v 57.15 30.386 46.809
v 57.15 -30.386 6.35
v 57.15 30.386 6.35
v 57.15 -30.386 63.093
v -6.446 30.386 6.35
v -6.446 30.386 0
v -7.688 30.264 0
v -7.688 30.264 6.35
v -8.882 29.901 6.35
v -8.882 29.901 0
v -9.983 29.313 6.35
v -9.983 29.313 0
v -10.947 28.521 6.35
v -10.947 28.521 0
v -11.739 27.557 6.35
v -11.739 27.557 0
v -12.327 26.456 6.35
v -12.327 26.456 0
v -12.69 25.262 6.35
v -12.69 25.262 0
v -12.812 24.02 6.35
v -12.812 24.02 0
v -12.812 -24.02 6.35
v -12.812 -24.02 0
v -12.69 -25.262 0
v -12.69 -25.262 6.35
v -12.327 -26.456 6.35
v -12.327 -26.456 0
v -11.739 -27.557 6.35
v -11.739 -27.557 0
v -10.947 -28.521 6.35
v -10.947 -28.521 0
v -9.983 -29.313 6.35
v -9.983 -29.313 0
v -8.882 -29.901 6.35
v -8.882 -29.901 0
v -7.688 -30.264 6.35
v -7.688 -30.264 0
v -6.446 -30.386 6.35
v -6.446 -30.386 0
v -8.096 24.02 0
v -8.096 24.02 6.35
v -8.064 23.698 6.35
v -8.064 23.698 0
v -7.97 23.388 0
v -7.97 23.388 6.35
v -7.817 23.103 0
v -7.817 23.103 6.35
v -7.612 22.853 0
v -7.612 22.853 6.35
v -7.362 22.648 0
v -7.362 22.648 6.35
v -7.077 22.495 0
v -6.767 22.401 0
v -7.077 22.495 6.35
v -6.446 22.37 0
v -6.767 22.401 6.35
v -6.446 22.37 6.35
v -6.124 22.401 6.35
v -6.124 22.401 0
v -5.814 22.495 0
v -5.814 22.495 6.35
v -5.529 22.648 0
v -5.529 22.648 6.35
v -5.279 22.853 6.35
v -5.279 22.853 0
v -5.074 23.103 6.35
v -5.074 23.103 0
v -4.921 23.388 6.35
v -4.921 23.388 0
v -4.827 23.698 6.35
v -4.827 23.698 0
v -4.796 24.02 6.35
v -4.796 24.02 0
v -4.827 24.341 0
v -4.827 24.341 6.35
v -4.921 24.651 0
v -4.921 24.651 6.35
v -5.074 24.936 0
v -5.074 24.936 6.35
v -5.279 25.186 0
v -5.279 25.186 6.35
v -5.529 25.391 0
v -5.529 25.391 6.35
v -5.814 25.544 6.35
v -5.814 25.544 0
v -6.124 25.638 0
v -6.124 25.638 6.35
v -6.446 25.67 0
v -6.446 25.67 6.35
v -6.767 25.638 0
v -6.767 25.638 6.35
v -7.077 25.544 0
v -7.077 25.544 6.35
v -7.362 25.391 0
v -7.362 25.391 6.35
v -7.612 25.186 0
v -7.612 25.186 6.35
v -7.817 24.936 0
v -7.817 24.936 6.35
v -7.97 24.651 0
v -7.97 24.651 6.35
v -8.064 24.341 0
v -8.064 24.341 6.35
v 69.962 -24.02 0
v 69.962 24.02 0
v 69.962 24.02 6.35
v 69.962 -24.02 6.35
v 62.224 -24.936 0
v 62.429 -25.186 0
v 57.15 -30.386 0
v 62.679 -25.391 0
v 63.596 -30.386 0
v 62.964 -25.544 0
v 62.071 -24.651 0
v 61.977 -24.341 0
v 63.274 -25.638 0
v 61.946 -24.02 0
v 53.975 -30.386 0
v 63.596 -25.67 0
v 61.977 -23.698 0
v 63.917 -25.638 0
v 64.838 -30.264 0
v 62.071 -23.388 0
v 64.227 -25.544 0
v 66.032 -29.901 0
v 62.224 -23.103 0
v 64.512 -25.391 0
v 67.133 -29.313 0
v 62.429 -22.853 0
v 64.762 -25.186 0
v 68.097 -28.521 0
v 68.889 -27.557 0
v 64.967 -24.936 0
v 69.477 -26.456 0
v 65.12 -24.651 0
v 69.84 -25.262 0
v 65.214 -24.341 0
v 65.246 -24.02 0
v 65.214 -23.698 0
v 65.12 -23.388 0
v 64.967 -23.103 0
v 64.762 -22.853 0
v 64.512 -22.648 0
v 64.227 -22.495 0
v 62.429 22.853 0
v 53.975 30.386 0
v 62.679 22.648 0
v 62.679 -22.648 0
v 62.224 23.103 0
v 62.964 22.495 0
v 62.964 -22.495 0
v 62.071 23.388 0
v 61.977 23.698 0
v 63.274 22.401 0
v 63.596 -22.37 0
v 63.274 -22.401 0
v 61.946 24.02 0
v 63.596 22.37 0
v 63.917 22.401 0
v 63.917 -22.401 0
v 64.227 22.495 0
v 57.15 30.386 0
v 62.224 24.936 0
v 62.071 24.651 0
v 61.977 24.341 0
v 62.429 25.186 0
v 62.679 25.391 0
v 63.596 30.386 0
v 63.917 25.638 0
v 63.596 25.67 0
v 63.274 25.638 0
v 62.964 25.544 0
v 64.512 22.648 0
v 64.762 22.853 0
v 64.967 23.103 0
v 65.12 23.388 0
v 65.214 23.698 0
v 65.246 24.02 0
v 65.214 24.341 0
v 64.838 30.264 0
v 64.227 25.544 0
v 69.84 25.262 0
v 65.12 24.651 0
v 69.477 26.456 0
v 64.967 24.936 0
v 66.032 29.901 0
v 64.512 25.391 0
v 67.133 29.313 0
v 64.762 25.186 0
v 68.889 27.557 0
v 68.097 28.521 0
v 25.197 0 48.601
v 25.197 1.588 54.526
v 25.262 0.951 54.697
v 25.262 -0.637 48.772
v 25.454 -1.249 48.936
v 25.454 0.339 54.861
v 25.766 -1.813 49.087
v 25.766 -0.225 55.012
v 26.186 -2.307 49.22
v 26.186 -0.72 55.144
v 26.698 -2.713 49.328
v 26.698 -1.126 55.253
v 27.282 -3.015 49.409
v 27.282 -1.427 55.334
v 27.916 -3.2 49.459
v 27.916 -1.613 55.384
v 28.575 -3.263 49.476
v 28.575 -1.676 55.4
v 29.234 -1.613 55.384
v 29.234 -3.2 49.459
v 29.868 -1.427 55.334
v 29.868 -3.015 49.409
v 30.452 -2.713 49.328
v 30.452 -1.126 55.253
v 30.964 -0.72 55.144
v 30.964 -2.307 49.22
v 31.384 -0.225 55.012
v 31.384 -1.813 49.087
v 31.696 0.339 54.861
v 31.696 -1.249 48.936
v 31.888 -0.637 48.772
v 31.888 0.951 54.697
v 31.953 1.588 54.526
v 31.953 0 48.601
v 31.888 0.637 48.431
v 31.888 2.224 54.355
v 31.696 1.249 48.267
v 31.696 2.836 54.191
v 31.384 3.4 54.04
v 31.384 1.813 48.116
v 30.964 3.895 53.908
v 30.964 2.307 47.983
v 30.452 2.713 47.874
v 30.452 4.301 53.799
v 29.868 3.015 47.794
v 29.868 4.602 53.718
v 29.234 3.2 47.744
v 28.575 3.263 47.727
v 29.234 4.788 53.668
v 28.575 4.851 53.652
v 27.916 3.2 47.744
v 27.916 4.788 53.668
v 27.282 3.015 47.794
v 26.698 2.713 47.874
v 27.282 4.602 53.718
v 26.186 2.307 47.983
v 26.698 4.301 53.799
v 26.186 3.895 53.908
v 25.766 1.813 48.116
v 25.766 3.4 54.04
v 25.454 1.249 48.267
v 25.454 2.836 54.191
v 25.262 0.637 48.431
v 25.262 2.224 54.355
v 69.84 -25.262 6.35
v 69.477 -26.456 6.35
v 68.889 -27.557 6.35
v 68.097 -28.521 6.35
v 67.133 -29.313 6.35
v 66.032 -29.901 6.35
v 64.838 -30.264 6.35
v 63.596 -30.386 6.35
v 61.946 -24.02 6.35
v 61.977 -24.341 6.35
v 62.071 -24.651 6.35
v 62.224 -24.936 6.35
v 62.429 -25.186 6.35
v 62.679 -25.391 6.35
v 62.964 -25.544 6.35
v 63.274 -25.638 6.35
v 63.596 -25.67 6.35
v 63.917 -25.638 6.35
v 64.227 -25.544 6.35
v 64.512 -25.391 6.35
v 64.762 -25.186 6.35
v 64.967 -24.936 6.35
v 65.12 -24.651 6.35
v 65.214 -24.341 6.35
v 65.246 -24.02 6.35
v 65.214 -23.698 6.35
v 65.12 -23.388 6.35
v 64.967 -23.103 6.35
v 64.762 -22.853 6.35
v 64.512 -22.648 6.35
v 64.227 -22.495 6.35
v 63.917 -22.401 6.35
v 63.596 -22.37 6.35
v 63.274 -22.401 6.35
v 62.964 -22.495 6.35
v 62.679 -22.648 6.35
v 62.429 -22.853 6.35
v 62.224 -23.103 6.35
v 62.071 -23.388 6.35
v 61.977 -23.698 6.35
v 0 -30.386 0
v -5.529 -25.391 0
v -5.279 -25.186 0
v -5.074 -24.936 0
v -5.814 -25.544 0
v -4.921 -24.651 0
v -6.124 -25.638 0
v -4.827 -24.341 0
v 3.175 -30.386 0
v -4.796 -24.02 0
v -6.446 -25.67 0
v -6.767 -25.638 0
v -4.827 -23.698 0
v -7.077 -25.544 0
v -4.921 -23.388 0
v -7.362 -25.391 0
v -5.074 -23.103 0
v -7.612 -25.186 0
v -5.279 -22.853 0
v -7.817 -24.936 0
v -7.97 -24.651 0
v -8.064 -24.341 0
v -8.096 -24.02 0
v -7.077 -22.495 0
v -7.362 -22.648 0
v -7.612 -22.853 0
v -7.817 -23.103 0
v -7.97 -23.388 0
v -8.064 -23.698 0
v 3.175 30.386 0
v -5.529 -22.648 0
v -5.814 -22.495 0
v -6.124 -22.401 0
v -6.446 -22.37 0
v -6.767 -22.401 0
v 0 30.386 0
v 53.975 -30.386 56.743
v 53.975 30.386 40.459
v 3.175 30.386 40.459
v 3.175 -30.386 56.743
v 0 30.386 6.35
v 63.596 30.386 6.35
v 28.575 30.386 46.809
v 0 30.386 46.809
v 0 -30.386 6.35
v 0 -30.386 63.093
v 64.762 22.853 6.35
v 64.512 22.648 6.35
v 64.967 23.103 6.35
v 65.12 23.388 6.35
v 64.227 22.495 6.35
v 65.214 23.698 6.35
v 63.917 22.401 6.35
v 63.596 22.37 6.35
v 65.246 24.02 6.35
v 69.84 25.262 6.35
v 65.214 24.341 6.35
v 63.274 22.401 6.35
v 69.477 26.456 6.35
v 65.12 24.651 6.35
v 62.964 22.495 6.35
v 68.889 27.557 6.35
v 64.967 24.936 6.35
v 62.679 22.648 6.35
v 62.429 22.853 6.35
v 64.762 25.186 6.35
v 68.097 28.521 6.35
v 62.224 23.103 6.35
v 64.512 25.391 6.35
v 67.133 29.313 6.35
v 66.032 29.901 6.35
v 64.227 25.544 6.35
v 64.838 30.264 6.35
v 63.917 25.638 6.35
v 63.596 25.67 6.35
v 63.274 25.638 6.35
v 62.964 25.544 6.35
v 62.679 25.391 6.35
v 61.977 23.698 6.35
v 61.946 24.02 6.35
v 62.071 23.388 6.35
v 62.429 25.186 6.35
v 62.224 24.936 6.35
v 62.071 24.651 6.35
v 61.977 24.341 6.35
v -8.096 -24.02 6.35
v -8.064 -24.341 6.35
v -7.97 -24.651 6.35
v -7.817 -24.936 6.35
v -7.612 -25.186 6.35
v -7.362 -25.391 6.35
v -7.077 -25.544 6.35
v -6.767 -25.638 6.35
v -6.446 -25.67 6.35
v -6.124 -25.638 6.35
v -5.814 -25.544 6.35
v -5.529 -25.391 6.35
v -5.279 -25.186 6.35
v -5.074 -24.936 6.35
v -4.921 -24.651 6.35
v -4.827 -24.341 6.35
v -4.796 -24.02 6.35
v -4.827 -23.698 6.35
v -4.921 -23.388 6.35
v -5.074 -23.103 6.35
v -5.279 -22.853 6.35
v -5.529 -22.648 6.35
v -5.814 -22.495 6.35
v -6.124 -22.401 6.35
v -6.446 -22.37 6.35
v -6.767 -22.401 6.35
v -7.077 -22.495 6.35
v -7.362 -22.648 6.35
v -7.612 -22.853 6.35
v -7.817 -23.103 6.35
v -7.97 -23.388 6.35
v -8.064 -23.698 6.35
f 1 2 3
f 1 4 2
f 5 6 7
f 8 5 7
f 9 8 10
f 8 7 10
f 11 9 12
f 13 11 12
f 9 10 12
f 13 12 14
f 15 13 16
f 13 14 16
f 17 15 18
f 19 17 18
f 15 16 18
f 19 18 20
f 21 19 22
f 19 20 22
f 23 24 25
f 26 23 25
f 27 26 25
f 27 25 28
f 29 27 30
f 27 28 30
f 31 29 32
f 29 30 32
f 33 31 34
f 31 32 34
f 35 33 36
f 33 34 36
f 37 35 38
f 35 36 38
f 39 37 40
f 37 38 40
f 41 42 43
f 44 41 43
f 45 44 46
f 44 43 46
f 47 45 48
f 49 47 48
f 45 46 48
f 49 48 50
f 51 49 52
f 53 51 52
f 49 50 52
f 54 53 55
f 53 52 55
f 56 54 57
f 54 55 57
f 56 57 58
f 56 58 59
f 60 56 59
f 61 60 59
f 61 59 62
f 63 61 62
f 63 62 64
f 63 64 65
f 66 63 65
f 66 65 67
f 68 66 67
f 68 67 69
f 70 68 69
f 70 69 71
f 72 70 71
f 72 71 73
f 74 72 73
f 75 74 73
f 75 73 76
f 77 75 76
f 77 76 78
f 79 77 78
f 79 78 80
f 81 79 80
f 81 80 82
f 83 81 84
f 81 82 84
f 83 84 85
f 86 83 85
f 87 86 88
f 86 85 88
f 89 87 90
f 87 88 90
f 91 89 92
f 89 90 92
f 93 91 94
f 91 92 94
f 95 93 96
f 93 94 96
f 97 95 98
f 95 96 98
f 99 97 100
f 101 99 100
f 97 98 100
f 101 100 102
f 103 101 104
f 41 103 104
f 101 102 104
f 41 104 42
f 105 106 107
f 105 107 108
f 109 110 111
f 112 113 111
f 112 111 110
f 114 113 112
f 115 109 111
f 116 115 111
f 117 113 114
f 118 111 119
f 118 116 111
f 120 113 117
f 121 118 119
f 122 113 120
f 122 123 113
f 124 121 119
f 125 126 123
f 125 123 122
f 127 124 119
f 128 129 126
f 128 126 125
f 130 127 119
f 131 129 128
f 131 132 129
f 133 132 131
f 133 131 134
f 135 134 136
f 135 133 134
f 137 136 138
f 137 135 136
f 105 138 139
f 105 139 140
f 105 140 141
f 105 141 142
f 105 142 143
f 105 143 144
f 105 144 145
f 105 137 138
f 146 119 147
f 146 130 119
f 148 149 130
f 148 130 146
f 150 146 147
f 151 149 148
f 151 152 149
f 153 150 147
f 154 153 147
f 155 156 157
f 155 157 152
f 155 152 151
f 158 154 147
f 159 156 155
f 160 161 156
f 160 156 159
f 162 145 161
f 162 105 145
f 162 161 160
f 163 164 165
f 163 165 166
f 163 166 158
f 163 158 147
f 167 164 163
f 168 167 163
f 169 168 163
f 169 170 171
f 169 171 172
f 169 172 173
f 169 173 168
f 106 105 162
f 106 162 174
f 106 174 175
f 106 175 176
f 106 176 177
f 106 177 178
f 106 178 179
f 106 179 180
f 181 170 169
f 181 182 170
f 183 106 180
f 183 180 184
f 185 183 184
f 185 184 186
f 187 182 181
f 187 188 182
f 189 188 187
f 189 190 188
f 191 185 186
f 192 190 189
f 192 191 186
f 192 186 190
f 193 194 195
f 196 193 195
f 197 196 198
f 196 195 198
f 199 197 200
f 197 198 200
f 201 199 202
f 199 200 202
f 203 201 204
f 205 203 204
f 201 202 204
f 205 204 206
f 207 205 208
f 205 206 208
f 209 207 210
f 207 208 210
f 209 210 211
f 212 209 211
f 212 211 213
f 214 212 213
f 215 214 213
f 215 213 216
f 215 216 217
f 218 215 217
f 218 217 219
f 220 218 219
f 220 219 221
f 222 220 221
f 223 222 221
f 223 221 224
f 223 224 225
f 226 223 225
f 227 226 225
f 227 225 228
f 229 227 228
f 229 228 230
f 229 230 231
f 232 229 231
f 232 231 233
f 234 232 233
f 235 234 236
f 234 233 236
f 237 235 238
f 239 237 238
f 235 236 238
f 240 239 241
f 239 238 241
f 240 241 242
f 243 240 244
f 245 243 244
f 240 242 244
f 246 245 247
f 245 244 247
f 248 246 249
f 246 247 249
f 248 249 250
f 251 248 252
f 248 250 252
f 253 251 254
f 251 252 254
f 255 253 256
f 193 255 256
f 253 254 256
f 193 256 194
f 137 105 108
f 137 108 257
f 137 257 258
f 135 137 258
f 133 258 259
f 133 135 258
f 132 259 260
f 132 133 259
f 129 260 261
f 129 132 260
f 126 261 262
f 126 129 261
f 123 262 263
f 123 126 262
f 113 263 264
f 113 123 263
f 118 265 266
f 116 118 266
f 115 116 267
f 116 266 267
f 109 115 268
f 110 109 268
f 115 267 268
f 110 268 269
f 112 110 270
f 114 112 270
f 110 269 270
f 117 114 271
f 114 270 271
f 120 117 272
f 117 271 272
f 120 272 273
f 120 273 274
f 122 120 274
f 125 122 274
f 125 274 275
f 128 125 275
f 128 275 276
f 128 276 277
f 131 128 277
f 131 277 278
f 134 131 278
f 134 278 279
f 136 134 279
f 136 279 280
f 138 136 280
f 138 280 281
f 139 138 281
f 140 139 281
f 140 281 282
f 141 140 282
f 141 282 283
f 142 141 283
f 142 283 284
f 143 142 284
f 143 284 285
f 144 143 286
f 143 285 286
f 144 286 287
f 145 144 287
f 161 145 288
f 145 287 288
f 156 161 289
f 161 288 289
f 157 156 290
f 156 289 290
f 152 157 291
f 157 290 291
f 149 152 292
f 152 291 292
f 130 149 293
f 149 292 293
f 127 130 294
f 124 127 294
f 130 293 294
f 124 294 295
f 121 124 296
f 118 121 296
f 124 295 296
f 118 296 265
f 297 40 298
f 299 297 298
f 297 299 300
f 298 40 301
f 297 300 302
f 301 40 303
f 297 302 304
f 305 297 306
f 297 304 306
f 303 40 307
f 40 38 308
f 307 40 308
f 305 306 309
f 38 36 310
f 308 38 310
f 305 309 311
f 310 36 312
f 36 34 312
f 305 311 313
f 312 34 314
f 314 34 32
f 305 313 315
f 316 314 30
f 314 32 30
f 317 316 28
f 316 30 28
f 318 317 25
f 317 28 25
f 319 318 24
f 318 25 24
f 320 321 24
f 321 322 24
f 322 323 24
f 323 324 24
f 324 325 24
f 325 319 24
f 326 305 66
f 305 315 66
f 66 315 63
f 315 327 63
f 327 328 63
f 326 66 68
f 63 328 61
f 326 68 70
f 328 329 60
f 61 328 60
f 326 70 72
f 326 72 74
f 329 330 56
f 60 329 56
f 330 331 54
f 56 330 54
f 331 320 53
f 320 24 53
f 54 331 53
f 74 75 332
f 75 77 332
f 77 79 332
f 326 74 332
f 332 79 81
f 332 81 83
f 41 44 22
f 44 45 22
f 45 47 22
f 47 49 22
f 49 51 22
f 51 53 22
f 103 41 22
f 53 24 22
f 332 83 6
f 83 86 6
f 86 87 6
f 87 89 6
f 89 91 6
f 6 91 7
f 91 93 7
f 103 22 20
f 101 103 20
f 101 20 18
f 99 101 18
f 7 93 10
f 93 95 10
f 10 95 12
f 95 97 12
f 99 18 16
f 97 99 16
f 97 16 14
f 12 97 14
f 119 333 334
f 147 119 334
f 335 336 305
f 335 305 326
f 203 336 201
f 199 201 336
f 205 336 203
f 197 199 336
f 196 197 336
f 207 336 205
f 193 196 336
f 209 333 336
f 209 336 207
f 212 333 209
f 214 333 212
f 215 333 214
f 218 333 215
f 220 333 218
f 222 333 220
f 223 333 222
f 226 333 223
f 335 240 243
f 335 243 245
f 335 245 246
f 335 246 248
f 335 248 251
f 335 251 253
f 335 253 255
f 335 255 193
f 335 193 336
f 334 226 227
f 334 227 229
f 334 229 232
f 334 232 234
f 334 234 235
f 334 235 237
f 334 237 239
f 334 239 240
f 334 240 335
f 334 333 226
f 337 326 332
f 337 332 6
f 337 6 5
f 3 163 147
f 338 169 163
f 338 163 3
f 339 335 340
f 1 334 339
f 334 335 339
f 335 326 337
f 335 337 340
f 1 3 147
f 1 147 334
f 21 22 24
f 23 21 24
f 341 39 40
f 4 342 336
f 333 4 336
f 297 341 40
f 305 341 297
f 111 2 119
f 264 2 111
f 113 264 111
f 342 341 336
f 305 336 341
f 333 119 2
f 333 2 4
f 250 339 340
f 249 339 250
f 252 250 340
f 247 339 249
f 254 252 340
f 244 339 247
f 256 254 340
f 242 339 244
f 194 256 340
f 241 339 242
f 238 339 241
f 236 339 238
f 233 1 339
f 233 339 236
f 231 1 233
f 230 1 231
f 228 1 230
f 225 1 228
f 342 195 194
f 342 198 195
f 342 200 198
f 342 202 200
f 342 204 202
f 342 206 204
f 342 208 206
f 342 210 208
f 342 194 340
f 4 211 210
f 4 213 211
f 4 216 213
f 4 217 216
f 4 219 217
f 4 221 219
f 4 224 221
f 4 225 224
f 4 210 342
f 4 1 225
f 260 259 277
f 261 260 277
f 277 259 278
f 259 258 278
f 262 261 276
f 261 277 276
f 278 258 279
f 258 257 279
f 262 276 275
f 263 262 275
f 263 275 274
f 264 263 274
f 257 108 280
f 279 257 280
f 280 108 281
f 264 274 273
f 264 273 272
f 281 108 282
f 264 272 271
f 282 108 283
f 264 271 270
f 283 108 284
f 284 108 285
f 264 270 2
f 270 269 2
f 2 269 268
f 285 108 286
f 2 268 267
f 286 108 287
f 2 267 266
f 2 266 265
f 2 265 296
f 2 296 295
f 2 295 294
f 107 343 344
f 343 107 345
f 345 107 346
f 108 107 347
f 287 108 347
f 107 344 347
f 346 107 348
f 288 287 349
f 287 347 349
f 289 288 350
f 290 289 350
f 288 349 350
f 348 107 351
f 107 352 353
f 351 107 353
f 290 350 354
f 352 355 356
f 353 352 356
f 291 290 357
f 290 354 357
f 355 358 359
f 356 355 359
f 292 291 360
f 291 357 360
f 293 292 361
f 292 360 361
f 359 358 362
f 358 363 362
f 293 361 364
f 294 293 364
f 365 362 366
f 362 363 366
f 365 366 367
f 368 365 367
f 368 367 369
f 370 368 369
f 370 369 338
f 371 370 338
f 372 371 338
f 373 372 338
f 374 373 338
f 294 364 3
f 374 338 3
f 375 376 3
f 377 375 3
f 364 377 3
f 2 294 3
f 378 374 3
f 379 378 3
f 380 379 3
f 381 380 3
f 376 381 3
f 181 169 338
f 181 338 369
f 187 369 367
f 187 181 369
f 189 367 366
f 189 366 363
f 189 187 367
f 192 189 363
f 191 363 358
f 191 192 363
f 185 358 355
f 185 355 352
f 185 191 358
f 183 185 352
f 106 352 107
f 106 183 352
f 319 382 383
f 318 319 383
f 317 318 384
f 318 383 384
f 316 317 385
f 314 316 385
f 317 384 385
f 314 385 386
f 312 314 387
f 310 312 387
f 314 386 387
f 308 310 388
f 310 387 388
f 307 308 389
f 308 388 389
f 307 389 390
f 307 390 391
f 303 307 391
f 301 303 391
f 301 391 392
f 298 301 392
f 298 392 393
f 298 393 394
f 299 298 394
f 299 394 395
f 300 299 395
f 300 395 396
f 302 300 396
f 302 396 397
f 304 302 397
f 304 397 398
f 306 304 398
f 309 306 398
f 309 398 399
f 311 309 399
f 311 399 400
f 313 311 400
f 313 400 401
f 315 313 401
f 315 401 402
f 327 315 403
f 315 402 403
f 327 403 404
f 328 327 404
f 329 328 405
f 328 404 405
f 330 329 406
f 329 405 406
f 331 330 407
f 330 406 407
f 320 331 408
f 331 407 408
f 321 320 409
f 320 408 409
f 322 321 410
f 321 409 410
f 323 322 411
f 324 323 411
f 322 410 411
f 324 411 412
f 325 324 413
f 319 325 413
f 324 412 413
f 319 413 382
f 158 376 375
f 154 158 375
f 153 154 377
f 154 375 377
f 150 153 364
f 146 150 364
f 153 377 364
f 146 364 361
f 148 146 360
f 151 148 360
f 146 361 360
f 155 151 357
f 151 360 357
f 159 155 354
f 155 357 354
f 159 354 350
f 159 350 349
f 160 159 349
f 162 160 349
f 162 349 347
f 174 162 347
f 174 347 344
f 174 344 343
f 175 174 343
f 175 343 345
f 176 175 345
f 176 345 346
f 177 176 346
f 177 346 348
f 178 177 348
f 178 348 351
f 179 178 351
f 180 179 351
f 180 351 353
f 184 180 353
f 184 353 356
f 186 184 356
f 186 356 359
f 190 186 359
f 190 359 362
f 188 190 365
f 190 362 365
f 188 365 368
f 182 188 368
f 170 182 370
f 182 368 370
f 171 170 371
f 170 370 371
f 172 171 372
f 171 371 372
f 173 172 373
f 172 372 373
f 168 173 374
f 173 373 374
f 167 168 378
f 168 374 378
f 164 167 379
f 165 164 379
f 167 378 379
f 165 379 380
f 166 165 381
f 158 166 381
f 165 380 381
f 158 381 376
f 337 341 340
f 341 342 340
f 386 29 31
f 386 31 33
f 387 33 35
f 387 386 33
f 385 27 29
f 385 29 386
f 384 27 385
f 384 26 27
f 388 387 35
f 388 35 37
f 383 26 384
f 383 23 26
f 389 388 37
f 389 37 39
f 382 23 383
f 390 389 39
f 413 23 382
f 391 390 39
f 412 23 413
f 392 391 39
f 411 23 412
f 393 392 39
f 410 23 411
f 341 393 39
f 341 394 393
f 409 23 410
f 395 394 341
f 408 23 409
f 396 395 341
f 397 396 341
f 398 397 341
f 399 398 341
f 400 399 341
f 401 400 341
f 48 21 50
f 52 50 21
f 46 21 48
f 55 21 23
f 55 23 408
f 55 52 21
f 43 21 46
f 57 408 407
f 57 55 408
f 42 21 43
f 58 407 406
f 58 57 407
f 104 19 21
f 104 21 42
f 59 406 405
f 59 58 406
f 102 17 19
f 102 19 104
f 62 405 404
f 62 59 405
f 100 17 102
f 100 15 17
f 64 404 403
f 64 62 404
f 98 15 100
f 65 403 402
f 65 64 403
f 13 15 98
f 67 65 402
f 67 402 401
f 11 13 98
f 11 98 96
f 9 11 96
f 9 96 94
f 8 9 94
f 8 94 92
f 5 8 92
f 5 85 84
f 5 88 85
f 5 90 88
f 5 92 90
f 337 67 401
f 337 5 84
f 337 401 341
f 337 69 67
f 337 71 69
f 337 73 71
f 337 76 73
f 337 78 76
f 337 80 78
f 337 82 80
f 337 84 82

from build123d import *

# Parameters (mm, degrees)
F1_DEPTH  = 6.35
F2_W      = 60.7720911503
F2_H      = 40.4594867892
F1_FACE_W = 60.7720911503
F1_FACE_H = 6.35
F3_DEPTH  = 3.175
F5_DEPTH  = 25.4
F8_D      = 6.7564
F10_D     = 3.3


with BuildPart() as f1:
    # F0 (on Top) → F1 (new body)
    with BuildSketch(Plane.XY):
        with BuildLine():
            Line((0, -30.3860455751), (0, 0))
            Line((0, 0), (0, 30.3860455751))
            Line((0, 30.3860455751), (-6.4455037937, 30.3860455751))
            Line((-6.4455037937, 30.3860455751), (-6.4455037937, 24.0195686368))
            Line((-6.4455037937, 24.0195686368), (-12.811980732, 24.0195686368))
            Line((-12.811980732, 24.0195686368), (-12.811980732, 0))
            Line((-12.811980732, 0), (-12.811980732, -24.0195686368))
            ThreePointArc((-12.811980732, -24.0195686368), (-10.947282809, -28.5213476522), (-6.4455037937, -30.3860455751))
            Line((-6.4455037937, -30.3860455751), (0, -30.3860455751))
        make_face()
        with BuildLine():
            Line((-6.4455037937, 24.0195686368), (-6.4455037937, 30.3860455751))
            ThreePointArc((-6.4455037937, 30.3860455751), (-10.947282809, 28.5213476522), (-12.811980732, 24.0195686368))
            Line((-12.811980732, 24.0195686368), (-6.4455037937, 24.0195686368))
        make_face()
    extrude(amount=F1_DEPTH)

    # F2 (on Right) + F1_face (on face) → F3 (join)
    with BuildSketch(Plane.YZ):
        with Locations((0, 26.5797433946)):
            Rectangle(F2_W, F2_H)
        Polygon((-30.3860455751, 63.0933195353), (-30.3860455751, 46.8094867892), (30.3860455751, 46.8094867892), align=None)
    with BuildSketch(Plane(origin=(0, 0, 3.175), x_dir=(0, 1, 0), z_dir=(1, 0, 0))):
        Rectangle(F1_FACE_W, F1_FACE_H)
    extrude(amount=F3_DEPTH)

    # F4 (on face) → F5 (join)
    with BuildSketch(Plane.YZ.offset(3.175)):
        Polygon((-30.3860455751, 63.0933195353), (-30.3860455751, 56.7433195353), (30.3860455751, 40.4594867892), (30.3860455751, 46.8094867892), align=None)
    extrude(amount=F5_DEPTH)

    # F6: F1 across face


with BuildPart() as f1_1:
    add(f1.part)
    add(f1.part.mirror(Plane(origin=(28.575, 0, 51.7764031622), x_dir=(0, 1, 0), z_dir=(1, 0, 0))))

    # F8 (through all)
    with Locations(Plane(origin=(0, 12.1503507906, 45.3457264801), x_dir=(1, 0, 0), z_dir=(0, -0.2588190451, -0.9659258263))):
        with Locations((28.575, 12.5789687571)):
            Hole(F8_D / 2)

    # F10 (through all)
    with Locations(Plane(origin=(0, 0, 0), x_dir=(1, 0, 0), z_dir=(0, 0, -1))):
        with Locations((-6.4455037937, 24.0195686368), (-6.4455037937, -24.0195686368), (63.5955037937, -24.0195686368), (63.5955037937, 24.0195686368)):
            Hole(F10_D / 2)


solid = f1_1.part
